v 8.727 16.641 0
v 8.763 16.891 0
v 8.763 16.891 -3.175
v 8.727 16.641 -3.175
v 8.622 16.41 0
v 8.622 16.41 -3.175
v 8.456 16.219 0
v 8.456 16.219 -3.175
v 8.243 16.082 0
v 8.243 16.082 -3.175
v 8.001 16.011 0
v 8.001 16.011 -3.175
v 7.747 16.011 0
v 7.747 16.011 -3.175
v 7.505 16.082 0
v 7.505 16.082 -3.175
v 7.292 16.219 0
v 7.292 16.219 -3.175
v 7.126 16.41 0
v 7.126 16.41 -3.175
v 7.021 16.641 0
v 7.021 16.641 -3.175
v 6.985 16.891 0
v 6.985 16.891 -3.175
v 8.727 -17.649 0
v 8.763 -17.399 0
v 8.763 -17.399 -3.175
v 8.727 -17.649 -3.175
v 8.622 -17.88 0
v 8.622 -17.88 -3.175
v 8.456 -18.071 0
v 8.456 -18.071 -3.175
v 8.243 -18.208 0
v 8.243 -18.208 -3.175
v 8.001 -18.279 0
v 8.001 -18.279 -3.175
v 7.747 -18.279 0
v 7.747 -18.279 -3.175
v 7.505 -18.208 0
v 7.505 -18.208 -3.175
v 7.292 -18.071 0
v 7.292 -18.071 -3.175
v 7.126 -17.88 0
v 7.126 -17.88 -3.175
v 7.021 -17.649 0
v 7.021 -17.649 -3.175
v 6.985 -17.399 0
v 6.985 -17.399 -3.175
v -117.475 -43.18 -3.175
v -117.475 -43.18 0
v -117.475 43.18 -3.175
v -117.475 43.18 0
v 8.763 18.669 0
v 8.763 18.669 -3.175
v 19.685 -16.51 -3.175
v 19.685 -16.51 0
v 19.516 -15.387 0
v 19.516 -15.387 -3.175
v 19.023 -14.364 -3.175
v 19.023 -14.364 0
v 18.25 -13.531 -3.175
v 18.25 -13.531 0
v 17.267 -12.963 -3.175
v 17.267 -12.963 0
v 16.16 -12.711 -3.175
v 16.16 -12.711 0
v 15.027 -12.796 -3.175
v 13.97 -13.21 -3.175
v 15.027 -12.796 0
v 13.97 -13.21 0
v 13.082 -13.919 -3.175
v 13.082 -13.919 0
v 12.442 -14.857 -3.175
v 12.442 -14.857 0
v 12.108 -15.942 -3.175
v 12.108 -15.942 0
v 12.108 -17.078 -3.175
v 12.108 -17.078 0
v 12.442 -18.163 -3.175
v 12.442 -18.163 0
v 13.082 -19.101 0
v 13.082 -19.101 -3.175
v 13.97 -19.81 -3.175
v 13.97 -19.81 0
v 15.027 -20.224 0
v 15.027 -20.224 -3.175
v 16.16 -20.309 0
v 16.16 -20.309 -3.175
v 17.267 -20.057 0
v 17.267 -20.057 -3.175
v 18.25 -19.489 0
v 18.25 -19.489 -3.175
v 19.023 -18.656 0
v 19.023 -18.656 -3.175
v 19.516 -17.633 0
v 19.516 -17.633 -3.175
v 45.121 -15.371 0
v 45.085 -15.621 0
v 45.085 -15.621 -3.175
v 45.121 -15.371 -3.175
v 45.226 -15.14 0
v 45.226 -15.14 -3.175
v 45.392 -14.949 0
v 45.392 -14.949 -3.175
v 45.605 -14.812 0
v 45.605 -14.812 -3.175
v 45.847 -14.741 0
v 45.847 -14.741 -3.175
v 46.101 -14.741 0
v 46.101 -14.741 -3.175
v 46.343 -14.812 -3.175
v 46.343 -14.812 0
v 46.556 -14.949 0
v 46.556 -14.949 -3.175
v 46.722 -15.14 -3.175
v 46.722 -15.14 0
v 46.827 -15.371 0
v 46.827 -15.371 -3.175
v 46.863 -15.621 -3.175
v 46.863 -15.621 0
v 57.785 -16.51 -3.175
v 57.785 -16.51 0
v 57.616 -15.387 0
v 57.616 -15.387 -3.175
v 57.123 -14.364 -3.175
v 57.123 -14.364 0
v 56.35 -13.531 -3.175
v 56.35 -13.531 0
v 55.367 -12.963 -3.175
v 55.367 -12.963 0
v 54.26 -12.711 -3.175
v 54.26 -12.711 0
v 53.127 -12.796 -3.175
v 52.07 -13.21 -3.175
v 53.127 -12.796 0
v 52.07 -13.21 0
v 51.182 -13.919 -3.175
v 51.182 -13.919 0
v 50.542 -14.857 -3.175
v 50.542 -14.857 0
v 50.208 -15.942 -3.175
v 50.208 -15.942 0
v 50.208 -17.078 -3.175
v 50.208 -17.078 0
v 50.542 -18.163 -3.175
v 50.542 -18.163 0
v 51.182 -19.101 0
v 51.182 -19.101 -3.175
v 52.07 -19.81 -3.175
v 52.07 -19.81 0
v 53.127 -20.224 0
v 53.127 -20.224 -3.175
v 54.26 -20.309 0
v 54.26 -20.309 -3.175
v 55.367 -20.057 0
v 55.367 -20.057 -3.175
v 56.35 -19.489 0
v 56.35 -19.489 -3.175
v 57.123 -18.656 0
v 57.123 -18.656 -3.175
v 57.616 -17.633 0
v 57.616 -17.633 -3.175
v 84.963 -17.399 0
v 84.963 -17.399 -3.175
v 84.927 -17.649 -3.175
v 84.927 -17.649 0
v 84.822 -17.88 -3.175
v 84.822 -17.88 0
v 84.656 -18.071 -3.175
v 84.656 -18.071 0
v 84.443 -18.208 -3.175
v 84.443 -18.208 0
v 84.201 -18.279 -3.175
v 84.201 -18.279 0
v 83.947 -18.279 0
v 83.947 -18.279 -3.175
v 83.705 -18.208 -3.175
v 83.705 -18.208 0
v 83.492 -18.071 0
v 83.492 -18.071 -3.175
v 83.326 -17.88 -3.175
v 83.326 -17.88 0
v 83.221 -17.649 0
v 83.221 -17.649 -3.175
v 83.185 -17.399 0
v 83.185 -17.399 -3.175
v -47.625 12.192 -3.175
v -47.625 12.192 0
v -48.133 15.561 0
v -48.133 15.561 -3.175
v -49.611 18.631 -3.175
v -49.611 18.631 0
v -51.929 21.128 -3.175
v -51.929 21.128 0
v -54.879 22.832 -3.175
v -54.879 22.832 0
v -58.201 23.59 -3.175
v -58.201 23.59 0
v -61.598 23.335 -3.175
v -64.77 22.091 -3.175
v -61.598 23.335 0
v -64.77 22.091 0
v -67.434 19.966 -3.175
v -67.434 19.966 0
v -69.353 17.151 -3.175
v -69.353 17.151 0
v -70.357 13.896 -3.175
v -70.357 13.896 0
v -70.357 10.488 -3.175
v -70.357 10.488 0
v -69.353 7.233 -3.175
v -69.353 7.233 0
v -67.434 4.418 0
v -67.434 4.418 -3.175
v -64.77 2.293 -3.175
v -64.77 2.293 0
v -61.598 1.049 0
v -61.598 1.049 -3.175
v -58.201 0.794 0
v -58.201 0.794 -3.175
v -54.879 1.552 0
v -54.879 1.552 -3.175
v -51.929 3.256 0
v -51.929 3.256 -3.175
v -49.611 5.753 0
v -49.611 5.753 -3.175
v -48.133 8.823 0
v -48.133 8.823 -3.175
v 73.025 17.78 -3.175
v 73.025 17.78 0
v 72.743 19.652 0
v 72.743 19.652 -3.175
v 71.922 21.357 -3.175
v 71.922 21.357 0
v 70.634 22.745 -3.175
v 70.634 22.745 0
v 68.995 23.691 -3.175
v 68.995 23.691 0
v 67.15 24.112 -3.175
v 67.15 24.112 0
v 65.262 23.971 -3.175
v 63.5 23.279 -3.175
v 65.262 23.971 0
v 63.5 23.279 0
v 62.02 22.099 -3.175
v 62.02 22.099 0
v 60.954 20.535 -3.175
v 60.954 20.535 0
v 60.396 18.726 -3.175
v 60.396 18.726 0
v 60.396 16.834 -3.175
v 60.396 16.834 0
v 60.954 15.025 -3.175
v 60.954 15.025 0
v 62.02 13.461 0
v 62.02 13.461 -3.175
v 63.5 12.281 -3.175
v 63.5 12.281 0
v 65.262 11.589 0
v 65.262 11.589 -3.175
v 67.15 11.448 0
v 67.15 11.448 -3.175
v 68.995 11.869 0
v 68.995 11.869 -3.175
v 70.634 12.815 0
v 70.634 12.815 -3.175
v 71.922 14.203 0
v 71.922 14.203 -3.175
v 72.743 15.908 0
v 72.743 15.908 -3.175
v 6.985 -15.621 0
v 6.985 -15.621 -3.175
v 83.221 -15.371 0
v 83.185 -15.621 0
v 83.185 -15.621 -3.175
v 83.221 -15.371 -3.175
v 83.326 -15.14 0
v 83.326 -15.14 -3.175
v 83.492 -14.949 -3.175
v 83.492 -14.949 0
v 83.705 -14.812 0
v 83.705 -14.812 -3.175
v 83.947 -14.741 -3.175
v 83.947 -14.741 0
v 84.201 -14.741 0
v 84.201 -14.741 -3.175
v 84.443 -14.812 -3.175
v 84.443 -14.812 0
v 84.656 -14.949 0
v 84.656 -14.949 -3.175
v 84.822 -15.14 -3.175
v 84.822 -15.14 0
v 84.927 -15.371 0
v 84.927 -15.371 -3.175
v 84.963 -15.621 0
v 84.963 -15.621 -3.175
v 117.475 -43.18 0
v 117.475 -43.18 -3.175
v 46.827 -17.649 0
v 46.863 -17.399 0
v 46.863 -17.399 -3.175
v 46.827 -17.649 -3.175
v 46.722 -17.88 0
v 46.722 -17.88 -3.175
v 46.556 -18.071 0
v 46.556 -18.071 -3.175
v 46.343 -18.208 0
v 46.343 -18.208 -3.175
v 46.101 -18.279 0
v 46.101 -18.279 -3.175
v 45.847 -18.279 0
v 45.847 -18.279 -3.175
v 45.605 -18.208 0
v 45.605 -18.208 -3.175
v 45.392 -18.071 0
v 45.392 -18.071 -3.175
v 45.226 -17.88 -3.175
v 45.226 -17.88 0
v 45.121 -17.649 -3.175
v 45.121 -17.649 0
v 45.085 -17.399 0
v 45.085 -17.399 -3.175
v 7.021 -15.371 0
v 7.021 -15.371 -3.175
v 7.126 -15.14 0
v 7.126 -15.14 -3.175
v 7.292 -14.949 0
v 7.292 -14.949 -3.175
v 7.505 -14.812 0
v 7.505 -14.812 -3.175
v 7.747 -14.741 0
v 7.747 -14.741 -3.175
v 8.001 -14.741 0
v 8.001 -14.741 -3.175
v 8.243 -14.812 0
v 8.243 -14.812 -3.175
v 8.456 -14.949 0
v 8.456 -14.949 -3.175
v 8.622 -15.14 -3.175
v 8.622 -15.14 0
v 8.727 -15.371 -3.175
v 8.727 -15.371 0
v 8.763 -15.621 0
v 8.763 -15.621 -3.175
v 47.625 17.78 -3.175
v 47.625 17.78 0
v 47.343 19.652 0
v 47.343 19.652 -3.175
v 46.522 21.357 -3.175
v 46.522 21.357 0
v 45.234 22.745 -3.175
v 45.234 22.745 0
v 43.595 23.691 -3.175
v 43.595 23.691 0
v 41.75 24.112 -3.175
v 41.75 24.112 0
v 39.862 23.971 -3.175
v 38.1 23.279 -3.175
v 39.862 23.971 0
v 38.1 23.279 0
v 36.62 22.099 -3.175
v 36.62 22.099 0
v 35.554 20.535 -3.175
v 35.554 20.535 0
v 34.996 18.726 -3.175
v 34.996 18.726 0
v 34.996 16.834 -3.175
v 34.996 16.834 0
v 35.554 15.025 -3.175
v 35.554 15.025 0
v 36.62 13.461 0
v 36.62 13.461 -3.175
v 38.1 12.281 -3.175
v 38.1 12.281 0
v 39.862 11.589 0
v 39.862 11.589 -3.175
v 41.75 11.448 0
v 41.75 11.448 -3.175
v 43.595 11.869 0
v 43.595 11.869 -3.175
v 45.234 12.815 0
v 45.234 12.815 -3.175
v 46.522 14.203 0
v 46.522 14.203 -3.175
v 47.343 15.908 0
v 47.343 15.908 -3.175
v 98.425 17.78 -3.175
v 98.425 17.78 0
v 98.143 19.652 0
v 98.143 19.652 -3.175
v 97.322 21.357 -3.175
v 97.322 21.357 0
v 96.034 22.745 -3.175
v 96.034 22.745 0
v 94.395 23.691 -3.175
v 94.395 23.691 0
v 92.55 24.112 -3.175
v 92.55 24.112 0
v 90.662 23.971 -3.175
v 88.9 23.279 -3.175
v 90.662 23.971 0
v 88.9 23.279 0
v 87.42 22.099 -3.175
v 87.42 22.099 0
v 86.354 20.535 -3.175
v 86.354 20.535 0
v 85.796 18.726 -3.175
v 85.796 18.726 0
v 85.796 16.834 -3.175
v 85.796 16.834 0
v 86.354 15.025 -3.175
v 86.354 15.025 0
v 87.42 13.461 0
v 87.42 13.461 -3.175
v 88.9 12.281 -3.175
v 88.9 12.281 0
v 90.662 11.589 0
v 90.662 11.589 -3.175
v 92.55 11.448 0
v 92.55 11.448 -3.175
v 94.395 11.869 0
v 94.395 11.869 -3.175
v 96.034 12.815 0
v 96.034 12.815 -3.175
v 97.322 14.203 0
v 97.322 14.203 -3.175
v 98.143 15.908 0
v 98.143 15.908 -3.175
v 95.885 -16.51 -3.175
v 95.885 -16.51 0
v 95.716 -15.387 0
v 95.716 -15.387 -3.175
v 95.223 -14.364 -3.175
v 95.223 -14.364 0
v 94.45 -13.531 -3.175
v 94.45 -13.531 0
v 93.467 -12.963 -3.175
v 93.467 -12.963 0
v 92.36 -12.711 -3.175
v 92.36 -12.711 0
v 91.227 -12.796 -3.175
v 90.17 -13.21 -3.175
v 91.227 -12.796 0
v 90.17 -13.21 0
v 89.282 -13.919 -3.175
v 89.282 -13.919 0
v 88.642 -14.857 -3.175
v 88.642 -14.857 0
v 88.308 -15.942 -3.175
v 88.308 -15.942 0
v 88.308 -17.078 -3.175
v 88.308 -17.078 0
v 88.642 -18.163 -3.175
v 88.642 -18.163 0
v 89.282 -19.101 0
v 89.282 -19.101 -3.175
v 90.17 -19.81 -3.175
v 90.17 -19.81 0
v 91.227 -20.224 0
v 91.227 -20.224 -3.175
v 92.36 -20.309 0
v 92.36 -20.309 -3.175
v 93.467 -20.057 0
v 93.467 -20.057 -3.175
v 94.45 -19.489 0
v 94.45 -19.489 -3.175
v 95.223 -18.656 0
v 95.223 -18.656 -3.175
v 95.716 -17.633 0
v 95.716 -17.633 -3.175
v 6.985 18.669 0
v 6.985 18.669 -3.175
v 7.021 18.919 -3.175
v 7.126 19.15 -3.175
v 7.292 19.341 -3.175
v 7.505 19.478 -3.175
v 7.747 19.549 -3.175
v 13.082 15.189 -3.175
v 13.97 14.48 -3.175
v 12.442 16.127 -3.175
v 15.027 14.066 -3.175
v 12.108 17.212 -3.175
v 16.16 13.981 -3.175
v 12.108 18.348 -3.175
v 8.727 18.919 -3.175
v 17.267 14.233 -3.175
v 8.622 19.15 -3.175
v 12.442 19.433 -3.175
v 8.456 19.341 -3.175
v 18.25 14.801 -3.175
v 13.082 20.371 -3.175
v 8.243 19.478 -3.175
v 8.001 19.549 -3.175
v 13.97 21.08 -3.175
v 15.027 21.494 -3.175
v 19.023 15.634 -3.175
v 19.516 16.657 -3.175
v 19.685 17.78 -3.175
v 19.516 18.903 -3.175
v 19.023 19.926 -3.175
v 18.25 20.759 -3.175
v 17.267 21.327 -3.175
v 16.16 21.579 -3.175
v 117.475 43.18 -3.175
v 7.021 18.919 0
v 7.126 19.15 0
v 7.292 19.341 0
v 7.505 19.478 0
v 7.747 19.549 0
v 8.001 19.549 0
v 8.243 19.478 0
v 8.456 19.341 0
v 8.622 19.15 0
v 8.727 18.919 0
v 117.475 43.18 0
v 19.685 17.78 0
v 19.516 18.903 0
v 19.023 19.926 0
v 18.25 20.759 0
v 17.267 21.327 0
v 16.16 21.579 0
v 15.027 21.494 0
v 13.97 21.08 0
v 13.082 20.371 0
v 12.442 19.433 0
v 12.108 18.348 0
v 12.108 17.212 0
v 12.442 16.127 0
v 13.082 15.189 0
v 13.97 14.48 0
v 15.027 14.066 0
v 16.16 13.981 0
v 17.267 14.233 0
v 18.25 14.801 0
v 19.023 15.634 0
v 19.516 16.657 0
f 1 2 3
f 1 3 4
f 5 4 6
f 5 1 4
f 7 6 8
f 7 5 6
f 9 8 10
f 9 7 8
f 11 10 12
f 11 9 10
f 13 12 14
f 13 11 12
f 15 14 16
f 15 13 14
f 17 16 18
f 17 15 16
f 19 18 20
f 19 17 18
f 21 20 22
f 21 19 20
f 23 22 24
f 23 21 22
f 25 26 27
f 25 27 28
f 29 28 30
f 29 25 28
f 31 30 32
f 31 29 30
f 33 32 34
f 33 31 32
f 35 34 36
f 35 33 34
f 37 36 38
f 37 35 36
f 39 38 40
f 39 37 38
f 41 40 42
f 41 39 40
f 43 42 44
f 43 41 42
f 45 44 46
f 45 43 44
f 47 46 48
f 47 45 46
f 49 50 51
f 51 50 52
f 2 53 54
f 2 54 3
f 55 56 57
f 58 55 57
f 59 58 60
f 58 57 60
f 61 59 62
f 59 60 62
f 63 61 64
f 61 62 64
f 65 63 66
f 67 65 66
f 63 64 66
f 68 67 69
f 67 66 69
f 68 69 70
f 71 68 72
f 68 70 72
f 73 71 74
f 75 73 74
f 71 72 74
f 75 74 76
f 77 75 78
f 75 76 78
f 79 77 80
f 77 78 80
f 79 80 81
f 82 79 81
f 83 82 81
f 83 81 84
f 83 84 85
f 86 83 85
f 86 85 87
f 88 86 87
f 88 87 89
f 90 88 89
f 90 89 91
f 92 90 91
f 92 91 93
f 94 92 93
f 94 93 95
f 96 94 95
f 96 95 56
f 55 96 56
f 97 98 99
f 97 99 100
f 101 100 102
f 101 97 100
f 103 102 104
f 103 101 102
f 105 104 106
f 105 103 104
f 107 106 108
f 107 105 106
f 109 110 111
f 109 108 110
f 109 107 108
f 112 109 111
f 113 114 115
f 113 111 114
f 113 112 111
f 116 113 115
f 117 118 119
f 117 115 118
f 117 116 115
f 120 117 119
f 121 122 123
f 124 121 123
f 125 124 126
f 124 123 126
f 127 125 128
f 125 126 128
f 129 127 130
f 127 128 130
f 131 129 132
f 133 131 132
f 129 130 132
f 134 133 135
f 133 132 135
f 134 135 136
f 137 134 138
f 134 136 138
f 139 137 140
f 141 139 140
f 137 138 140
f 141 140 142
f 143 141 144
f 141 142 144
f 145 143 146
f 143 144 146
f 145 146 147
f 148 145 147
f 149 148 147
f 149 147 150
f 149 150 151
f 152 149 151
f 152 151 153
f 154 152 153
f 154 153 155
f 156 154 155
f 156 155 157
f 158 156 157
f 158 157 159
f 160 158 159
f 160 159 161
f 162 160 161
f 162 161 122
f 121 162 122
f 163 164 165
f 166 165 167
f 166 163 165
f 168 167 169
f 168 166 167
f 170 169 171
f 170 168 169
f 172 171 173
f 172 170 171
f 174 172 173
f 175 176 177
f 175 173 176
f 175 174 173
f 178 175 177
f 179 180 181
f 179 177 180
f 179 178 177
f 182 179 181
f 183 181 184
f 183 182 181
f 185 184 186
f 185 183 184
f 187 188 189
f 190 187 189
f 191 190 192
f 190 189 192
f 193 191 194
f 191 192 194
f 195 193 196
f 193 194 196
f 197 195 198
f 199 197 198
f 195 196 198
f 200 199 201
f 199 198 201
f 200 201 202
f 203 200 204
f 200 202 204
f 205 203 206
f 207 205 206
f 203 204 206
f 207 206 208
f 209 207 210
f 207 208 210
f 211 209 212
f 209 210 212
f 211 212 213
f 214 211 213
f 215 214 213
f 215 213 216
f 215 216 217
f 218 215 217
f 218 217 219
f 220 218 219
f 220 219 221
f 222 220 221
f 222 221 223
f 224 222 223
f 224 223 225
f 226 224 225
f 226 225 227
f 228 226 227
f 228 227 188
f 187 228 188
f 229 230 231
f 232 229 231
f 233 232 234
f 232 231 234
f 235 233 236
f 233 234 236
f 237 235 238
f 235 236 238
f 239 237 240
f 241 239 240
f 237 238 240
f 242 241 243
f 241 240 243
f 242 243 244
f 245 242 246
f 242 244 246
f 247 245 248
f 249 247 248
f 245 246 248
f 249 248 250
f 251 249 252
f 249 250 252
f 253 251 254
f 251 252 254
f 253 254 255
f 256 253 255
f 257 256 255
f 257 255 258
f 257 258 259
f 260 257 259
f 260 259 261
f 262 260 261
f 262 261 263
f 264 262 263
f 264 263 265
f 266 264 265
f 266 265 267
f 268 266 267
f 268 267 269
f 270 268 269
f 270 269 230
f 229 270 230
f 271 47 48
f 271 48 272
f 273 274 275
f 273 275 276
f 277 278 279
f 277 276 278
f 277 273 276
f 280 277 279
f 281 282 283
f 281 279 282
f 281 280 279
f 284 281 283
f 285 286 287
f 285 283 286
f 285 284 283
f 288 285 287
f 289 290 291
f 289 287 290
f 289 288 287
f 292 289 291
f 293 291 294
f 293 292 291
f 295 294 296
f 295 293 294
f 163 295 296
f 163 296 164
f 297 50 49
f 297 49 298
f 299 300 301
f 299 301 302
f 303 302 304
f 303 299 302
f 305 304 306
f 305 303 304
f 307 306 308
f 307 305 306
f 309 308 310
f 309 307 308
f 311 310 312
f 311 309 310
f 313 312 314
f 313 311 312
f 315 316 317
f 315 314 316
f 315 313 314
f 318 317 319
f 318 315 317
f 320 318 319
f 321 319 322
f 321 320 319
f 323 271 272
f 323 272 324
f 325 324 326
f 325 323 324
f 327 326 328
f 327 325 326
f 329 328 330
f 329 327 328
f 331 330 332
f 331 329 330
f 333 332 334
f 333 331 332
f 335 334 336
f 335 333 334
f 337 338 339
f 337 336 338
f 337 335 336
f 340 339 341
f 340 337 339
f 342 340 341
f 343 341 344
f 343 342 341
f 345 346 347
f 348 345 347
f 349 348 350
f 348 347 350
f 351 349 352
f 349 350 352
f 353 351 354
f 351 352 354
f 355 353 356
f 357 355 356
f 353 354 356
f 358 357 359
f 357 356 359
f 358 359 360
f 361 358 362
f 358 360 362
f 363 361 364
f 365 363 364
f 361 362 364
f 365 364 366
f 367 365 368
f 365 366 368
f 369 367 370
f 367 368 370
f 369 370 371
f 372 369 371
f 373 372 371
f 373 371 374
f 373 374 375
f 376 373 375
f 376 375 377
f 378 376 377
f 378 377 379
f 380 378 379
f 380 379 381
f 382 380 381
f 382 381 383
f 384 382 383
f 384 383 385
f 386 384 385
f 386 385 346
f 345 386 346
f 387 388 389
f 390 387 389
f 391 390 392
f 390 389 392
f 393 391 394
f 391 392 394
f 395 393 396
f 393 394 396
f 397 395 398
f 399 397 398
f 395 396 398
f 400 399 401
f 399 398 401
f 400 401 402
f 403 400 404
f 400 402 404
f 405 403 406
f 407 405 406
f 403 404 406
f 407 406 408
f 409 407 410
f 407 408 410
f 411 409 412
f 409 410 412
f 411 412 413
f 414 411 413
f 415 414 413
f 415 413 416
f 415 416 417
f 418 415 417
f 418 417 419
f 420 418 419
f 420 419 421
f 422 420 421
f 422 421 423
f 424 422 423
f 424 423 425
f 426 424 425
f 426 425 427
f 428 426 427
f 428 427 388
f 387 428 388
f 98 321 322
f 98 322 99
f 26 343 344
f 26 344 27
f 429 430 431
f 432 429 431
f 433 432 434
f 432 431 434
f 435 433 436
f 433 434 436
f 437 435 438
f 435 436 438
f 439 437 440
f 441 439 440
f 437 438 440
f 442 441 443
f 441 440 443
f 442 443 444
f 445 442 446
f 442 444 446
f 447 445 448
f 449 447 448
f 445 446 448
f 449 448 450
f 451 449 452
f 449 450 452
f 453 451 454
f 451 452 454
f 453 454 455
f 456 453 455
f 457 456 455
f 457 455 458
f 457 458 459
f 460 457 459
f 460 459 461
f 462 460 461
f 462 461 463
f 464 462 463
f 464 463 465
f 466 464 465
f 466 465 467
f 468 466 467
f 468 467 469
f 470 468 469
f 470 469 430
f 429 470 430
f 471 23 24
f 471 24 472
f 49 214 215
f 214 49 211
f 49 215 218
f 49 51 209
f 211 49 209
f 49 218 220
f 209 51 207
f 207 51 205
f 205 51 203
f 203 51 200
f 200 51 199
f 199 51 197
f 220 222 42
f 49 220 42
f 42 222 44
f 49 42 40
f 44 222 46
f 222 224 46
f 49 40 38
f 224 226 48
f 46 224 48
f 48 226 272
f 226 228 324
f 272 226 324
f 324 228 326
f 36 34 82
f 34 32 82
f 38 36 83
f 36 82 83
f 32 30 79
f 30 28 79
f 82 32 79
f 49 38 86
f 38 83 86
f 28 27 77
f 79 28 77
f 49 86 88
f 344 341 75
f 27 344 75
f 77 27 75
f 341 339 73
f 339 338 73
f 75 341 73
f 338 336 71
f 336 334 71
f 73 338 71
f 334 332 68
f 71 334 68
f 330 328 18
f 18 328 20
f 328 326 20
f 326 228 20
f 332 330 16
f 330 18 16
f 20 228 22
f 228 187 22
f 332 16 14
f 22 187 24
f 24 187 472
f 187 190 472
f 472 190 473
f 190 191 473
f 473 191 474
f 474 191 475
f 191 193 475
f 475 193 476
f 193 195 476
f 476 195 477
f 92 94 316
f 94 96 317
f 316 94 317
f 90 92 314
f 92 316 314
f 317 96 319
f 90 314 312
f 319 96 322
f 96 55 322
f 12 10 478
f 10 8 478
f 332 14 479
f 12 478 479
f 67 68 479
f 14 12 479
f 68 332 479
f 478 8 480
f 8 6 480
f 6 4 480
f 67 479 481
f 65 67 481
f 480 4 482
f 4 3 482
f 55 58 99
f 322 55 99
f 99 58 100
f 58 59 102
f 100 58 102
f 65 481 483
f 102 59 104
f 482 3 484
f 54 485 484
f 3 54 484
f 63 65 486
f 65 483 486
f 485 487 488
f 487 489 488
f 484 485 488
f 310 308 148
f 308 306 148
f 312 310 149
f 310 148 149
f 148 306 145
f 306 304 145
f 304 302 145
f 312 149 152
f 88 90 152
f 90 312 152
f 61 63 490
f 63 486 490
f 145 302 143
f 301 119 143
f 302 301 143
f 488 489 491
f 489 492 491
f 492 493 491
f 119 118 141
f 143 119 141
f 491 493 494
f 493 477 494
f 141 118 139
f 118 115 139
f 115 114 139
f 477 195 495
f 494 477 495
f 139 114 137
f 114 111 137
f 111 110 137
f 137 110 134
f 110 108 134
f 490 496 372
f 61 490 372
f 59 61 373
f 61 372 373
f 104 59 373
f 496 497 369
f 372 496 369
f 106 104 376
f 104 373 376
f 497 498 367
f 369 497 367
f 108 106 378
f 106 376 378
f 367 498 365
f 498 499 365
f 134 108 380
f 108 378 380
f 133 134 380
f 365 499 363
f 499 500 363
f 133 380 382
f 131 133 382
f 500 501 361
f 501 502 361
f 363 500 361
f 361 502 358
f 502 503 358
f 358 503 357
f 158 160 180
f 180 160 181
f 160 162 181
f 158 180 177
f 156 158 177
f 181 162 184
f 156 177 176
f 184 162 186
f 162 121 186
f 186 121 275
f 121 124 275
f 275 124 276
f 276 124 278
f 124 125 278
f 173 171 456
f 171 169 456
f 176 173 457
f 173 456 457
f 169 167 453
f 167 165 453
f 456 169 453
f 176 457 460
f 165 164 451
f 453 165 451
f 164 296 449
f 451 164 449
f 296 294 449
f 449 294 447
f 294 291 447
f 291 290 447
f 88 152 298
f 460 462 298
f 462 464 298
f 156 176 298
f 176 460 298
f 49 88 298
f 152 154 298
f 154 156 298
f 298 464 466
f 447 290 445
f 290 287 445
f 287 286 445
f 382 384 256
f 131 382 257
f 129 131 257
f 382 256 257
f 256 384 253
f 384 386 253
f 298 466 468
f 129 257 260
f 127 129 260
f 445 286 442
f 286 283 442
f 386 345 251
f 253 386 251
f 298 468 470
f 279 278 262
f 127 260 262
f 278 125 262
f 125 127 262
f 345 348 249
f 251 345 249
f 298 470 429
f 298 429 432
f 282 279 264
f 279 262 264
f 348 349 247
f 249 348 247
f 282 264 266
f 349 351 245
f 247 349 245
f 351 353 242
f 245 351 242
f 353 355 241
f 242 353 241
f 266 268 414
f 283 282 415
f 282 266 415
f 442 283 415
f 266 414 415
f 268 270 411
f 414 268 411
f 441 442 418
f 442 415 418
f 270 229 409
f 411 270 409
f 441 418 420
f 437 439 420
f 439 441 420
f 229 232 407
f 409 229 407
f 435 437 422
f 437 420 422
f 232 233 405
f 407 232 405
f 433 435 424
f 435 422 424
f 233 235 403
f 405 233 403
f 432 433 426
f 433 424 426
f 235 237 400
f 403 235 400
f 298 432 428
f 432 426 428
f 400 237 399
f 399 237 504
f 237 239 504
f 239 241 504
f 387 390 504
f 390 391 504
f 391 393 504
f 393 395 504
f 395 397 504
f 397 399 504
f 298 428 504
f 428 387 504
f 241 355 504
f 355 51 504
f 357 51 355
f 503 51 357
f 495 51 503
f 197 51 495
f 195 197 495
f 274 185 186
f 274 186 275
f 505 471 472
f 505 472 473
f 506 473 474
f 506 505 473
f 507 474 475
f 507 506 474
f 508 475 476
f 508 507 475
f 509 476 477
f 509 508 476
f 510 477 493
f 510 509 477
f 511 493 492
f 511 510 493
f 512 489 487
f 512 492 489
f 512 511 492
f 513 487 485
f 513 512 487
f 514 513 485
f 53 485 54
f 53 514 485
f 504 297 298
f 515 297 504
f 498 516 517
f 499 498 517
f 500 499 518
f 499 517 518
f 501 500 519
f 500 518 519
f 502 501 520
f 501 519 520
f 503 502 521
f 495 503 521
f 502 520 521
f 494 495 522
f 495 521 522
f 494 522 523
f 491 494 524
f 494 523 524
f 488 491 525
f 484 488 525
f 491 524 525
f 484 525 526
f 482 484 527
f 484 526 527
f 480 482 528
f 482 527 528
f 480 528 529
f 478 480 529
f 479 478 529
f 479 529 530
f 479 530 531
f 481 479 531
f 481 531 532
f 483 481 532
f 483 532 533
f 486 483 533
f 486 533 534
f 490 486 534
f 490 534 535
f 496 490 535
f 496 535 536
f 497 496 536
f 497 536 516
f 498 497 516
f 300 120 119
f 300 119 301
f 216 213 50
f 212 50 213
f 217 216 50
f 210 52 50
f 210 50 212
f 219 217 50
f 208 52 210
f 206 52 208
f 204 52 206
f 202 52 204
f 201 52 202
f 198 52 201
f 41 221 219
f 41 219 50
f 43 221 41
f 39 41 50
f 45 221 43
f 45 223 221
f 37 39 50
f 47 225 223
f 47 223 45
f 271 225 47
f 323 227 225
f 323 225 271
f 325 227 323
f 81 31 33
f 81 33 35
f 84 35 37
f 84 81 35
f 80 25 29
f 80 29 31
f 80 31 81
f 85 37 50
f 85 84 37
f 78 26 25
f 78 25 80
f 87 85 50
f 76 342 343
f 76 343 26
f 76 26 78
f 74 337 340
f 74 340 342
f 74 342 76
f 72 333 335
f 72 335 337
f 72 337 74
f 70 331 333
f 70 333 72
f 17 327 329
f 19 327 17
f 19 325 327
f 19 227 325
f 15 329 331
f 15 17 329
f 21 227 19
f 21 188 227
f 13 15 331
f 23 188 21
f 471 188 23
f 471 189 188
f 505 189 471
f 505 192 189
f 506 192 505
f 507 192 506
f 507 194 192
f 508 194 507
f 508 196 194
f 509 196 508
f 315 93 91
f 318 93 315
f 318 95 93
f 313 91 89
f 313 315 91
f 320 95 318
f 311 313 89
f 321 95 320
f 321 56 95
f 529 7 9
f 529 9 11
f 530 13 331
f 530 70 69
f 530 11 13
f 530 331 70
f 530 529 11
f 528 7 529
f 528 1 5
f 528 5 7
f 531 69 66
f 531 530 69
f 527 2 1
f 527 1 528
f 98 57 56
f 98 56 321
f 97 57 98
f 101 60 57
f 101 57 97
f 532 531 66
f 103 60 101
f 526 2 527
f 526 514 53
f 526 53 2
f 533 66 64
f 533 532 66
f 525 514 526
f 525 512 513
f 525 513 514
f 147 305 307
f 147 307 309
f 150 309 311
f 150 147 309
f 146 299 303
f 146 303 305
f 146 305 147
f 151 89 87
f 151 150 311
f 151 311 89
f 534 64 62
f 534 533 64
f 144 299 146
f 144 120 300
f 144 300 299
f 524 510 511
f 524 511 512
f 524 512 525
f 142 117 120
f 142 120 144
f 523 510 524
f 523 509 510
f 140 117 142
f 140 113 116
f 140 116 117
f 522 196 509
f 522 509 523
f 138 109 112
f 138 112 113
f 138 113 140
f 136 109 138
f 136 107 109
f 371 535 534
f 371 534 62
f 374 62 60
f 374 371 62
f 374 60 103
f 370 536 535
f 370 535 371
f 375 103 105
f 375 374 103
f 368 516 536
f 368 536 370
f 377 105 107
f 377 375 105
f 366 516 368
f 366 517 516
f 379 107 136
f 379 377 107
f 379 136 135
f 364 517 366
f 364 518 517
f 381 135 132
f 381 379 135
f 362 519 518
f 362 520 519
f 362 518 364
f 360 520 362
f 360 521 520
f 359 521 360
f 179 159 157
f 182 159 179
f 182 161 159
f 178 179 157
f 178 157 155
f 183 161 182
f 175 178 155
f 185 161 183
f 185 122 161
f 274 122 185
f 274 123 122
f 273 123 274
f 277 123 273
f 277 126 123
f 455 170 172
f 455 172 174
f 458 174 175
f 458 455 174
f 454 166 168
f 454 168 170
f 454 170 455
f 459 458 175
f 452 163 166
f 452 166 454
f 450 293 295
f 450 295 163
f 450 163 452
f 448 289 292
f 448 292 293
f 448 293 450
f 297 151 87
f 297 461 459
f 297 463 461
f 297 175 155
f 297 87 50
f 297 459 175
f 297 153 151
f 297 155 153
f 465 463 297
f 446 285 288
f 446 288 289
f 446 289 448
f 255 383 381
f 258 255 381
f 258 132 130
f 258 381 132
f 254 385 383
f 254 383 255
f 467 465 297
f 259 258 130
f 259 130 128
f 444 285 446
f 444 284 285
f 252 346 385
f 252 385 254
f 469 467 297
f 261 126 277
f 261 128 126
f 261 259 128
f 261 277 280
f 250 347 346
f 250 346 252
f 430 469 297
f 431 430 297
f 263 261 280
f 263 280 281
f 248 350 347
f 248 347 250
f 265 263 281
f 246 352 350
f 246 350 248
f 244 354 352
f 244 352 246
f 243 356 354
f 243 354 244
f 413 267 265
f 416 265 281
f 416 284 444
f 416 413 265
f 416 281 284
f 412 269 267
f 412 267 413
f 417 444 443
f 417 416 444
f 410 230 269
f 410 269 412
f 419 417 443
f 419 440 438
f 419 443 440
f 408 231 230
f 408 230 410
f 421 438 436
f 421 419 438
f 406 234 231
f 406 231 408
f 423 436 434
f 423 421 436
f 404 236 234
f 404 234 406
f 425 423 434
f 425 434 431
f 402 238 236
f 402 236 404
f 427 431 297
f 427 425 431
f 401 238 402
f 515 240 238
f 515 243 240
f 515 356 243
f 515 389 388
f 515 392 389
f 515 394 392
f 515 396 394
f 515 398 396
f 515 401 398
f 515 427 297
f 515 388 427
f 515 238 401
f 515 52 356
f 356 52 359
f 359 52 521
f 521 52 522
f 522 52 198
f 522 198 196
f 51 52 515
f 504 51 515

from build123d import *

# Parameters (mm, degrees)
SKETCH1_W          = 234.95
SKETCH1_H          = 86.36
BASE_FLANGE1_DEPTH = 3.175
SKETCH11_R         = 6.35
CUT_EXTRUDE3_DEPTH = 126.199715056
SKETCH12_R         = 3.81
CUT_EXTRUDE4_DEPTH = 126.199715056
SKETCH13_R         = 11.43
CUT_EXTRUDE5_DEPTH = 126.199715056
SKETCH14_R         = 3.81
CUT_EXTRUDE6_DEPTH = 126.199715056


# Sheet-metal steps are written as plain solids
with BuildPart() as part:
    # Sketch1 → Base-Flange1 (new body)
    with BuildSketch(Plane.XY):
        Rectangle(SKETCH1_W, SKETCH1_H)
    extrude(amount=-BASE_FLANGE1_DEPTH)

    # Sketch11 → Cut-Extrude3 (cut, through all)
    with BuildSketch(Plane.XY):
        with Locations((41.275, 17.78)):
            Circle(SKETCH11_R)
        with Locations((66.675, 17.78)):
            Circle(SKETCH11_R)
        with Locations((92.075, 17.78)):
            Circle(SKETCH11_R)
    extrude(amount=-CUT_EXTRUDE3_DEPTH, mode=Mode.SUBTRACT)

    # Sketch12 → Cut-Extrude4 (cut, through all)
    with BuildSketch(Plane.XY):
        with Locations((92.075, -16.51)):
            Circle(SKETCH12_R)
        with Locations((53.975, -16.51)):
            Circle(SKETCH12_R)
        with Locations((15.875, -16.51)):
            Circle(SKETCH12_R)
        with BuildLine():
            Line((8.763, -15.621), (8.763, -17.399))
            ThreePointArc((8.763, -17.399), (7.874, -18.288), (6.985, -17.399))
            Line((6.985, -17.399), (6.985, -15.621))
            ThreePointArc((6.985, -15.621), (7.874, -14.732), (8.763, -15.621))
        make_face()
        with BuildLine():
            Line((46.863, -15.621), (46.863, -17.399))
            ThreePointArc((46.863, -17.399), (45.974, -18.288), (45.085, -17.399))
            Line((45.085, -17.399), (45.085, -15.621))
            ThreePointArc((45.085, -15.621), (45.974, -14.732), (46.863, -15.621))
        make_face()
        with BuildLine():
            Line((84.963, -15.621), (84.963, -17.399))
            ThreePointArc((84.963, -17.399), (84.074, -18.288), (83.185, -17.399))
            Line((83.185, -17.399), (83.185, -15.621))
            ThreePointArc((83.185, -15.621), (84.074, -14.732), (84.963, -15.621))
        make_face()
    extrude(amount=-CUT_EXTRUDE4_DEPTH, mode=Mode.SUBTRACT)

    # Sketch13 → Cut-Extrude5 (cut, through all)
    with BuildSketch(Plane.XY):
        with Locations((-59.055, 12.192)):
            Circle(SKETCH13_R)
    extrude(amount=-CUT_EXTRUDE5_DEPTH, mode=Mode.SUBTRACT)

    # Sketch14 → Cut-Extrude6 (cut, through all)
    with BuildSketch(Plane.XY):
        with Locations((15.875, 17.78)):
            Circle(SKETCH14_R)
        with BuildLine():
            Line((8.763, 18.669), (8.763, 16.891))
            ThreePointArc((8.763, 16.891), (7.874, 16.002), (6.985, 16.891))
            Line((6.985, 16.891), (6.985, 18.669))
            ThreePointArc((6.985, 18.669), (7.874, 19.558), (8.763, 18.669))
        make_face()
    extrude(amount=-CUT_EXTRUDE6_DEPTH, mode=Mode.SUBTRACT)


solid = part.part
